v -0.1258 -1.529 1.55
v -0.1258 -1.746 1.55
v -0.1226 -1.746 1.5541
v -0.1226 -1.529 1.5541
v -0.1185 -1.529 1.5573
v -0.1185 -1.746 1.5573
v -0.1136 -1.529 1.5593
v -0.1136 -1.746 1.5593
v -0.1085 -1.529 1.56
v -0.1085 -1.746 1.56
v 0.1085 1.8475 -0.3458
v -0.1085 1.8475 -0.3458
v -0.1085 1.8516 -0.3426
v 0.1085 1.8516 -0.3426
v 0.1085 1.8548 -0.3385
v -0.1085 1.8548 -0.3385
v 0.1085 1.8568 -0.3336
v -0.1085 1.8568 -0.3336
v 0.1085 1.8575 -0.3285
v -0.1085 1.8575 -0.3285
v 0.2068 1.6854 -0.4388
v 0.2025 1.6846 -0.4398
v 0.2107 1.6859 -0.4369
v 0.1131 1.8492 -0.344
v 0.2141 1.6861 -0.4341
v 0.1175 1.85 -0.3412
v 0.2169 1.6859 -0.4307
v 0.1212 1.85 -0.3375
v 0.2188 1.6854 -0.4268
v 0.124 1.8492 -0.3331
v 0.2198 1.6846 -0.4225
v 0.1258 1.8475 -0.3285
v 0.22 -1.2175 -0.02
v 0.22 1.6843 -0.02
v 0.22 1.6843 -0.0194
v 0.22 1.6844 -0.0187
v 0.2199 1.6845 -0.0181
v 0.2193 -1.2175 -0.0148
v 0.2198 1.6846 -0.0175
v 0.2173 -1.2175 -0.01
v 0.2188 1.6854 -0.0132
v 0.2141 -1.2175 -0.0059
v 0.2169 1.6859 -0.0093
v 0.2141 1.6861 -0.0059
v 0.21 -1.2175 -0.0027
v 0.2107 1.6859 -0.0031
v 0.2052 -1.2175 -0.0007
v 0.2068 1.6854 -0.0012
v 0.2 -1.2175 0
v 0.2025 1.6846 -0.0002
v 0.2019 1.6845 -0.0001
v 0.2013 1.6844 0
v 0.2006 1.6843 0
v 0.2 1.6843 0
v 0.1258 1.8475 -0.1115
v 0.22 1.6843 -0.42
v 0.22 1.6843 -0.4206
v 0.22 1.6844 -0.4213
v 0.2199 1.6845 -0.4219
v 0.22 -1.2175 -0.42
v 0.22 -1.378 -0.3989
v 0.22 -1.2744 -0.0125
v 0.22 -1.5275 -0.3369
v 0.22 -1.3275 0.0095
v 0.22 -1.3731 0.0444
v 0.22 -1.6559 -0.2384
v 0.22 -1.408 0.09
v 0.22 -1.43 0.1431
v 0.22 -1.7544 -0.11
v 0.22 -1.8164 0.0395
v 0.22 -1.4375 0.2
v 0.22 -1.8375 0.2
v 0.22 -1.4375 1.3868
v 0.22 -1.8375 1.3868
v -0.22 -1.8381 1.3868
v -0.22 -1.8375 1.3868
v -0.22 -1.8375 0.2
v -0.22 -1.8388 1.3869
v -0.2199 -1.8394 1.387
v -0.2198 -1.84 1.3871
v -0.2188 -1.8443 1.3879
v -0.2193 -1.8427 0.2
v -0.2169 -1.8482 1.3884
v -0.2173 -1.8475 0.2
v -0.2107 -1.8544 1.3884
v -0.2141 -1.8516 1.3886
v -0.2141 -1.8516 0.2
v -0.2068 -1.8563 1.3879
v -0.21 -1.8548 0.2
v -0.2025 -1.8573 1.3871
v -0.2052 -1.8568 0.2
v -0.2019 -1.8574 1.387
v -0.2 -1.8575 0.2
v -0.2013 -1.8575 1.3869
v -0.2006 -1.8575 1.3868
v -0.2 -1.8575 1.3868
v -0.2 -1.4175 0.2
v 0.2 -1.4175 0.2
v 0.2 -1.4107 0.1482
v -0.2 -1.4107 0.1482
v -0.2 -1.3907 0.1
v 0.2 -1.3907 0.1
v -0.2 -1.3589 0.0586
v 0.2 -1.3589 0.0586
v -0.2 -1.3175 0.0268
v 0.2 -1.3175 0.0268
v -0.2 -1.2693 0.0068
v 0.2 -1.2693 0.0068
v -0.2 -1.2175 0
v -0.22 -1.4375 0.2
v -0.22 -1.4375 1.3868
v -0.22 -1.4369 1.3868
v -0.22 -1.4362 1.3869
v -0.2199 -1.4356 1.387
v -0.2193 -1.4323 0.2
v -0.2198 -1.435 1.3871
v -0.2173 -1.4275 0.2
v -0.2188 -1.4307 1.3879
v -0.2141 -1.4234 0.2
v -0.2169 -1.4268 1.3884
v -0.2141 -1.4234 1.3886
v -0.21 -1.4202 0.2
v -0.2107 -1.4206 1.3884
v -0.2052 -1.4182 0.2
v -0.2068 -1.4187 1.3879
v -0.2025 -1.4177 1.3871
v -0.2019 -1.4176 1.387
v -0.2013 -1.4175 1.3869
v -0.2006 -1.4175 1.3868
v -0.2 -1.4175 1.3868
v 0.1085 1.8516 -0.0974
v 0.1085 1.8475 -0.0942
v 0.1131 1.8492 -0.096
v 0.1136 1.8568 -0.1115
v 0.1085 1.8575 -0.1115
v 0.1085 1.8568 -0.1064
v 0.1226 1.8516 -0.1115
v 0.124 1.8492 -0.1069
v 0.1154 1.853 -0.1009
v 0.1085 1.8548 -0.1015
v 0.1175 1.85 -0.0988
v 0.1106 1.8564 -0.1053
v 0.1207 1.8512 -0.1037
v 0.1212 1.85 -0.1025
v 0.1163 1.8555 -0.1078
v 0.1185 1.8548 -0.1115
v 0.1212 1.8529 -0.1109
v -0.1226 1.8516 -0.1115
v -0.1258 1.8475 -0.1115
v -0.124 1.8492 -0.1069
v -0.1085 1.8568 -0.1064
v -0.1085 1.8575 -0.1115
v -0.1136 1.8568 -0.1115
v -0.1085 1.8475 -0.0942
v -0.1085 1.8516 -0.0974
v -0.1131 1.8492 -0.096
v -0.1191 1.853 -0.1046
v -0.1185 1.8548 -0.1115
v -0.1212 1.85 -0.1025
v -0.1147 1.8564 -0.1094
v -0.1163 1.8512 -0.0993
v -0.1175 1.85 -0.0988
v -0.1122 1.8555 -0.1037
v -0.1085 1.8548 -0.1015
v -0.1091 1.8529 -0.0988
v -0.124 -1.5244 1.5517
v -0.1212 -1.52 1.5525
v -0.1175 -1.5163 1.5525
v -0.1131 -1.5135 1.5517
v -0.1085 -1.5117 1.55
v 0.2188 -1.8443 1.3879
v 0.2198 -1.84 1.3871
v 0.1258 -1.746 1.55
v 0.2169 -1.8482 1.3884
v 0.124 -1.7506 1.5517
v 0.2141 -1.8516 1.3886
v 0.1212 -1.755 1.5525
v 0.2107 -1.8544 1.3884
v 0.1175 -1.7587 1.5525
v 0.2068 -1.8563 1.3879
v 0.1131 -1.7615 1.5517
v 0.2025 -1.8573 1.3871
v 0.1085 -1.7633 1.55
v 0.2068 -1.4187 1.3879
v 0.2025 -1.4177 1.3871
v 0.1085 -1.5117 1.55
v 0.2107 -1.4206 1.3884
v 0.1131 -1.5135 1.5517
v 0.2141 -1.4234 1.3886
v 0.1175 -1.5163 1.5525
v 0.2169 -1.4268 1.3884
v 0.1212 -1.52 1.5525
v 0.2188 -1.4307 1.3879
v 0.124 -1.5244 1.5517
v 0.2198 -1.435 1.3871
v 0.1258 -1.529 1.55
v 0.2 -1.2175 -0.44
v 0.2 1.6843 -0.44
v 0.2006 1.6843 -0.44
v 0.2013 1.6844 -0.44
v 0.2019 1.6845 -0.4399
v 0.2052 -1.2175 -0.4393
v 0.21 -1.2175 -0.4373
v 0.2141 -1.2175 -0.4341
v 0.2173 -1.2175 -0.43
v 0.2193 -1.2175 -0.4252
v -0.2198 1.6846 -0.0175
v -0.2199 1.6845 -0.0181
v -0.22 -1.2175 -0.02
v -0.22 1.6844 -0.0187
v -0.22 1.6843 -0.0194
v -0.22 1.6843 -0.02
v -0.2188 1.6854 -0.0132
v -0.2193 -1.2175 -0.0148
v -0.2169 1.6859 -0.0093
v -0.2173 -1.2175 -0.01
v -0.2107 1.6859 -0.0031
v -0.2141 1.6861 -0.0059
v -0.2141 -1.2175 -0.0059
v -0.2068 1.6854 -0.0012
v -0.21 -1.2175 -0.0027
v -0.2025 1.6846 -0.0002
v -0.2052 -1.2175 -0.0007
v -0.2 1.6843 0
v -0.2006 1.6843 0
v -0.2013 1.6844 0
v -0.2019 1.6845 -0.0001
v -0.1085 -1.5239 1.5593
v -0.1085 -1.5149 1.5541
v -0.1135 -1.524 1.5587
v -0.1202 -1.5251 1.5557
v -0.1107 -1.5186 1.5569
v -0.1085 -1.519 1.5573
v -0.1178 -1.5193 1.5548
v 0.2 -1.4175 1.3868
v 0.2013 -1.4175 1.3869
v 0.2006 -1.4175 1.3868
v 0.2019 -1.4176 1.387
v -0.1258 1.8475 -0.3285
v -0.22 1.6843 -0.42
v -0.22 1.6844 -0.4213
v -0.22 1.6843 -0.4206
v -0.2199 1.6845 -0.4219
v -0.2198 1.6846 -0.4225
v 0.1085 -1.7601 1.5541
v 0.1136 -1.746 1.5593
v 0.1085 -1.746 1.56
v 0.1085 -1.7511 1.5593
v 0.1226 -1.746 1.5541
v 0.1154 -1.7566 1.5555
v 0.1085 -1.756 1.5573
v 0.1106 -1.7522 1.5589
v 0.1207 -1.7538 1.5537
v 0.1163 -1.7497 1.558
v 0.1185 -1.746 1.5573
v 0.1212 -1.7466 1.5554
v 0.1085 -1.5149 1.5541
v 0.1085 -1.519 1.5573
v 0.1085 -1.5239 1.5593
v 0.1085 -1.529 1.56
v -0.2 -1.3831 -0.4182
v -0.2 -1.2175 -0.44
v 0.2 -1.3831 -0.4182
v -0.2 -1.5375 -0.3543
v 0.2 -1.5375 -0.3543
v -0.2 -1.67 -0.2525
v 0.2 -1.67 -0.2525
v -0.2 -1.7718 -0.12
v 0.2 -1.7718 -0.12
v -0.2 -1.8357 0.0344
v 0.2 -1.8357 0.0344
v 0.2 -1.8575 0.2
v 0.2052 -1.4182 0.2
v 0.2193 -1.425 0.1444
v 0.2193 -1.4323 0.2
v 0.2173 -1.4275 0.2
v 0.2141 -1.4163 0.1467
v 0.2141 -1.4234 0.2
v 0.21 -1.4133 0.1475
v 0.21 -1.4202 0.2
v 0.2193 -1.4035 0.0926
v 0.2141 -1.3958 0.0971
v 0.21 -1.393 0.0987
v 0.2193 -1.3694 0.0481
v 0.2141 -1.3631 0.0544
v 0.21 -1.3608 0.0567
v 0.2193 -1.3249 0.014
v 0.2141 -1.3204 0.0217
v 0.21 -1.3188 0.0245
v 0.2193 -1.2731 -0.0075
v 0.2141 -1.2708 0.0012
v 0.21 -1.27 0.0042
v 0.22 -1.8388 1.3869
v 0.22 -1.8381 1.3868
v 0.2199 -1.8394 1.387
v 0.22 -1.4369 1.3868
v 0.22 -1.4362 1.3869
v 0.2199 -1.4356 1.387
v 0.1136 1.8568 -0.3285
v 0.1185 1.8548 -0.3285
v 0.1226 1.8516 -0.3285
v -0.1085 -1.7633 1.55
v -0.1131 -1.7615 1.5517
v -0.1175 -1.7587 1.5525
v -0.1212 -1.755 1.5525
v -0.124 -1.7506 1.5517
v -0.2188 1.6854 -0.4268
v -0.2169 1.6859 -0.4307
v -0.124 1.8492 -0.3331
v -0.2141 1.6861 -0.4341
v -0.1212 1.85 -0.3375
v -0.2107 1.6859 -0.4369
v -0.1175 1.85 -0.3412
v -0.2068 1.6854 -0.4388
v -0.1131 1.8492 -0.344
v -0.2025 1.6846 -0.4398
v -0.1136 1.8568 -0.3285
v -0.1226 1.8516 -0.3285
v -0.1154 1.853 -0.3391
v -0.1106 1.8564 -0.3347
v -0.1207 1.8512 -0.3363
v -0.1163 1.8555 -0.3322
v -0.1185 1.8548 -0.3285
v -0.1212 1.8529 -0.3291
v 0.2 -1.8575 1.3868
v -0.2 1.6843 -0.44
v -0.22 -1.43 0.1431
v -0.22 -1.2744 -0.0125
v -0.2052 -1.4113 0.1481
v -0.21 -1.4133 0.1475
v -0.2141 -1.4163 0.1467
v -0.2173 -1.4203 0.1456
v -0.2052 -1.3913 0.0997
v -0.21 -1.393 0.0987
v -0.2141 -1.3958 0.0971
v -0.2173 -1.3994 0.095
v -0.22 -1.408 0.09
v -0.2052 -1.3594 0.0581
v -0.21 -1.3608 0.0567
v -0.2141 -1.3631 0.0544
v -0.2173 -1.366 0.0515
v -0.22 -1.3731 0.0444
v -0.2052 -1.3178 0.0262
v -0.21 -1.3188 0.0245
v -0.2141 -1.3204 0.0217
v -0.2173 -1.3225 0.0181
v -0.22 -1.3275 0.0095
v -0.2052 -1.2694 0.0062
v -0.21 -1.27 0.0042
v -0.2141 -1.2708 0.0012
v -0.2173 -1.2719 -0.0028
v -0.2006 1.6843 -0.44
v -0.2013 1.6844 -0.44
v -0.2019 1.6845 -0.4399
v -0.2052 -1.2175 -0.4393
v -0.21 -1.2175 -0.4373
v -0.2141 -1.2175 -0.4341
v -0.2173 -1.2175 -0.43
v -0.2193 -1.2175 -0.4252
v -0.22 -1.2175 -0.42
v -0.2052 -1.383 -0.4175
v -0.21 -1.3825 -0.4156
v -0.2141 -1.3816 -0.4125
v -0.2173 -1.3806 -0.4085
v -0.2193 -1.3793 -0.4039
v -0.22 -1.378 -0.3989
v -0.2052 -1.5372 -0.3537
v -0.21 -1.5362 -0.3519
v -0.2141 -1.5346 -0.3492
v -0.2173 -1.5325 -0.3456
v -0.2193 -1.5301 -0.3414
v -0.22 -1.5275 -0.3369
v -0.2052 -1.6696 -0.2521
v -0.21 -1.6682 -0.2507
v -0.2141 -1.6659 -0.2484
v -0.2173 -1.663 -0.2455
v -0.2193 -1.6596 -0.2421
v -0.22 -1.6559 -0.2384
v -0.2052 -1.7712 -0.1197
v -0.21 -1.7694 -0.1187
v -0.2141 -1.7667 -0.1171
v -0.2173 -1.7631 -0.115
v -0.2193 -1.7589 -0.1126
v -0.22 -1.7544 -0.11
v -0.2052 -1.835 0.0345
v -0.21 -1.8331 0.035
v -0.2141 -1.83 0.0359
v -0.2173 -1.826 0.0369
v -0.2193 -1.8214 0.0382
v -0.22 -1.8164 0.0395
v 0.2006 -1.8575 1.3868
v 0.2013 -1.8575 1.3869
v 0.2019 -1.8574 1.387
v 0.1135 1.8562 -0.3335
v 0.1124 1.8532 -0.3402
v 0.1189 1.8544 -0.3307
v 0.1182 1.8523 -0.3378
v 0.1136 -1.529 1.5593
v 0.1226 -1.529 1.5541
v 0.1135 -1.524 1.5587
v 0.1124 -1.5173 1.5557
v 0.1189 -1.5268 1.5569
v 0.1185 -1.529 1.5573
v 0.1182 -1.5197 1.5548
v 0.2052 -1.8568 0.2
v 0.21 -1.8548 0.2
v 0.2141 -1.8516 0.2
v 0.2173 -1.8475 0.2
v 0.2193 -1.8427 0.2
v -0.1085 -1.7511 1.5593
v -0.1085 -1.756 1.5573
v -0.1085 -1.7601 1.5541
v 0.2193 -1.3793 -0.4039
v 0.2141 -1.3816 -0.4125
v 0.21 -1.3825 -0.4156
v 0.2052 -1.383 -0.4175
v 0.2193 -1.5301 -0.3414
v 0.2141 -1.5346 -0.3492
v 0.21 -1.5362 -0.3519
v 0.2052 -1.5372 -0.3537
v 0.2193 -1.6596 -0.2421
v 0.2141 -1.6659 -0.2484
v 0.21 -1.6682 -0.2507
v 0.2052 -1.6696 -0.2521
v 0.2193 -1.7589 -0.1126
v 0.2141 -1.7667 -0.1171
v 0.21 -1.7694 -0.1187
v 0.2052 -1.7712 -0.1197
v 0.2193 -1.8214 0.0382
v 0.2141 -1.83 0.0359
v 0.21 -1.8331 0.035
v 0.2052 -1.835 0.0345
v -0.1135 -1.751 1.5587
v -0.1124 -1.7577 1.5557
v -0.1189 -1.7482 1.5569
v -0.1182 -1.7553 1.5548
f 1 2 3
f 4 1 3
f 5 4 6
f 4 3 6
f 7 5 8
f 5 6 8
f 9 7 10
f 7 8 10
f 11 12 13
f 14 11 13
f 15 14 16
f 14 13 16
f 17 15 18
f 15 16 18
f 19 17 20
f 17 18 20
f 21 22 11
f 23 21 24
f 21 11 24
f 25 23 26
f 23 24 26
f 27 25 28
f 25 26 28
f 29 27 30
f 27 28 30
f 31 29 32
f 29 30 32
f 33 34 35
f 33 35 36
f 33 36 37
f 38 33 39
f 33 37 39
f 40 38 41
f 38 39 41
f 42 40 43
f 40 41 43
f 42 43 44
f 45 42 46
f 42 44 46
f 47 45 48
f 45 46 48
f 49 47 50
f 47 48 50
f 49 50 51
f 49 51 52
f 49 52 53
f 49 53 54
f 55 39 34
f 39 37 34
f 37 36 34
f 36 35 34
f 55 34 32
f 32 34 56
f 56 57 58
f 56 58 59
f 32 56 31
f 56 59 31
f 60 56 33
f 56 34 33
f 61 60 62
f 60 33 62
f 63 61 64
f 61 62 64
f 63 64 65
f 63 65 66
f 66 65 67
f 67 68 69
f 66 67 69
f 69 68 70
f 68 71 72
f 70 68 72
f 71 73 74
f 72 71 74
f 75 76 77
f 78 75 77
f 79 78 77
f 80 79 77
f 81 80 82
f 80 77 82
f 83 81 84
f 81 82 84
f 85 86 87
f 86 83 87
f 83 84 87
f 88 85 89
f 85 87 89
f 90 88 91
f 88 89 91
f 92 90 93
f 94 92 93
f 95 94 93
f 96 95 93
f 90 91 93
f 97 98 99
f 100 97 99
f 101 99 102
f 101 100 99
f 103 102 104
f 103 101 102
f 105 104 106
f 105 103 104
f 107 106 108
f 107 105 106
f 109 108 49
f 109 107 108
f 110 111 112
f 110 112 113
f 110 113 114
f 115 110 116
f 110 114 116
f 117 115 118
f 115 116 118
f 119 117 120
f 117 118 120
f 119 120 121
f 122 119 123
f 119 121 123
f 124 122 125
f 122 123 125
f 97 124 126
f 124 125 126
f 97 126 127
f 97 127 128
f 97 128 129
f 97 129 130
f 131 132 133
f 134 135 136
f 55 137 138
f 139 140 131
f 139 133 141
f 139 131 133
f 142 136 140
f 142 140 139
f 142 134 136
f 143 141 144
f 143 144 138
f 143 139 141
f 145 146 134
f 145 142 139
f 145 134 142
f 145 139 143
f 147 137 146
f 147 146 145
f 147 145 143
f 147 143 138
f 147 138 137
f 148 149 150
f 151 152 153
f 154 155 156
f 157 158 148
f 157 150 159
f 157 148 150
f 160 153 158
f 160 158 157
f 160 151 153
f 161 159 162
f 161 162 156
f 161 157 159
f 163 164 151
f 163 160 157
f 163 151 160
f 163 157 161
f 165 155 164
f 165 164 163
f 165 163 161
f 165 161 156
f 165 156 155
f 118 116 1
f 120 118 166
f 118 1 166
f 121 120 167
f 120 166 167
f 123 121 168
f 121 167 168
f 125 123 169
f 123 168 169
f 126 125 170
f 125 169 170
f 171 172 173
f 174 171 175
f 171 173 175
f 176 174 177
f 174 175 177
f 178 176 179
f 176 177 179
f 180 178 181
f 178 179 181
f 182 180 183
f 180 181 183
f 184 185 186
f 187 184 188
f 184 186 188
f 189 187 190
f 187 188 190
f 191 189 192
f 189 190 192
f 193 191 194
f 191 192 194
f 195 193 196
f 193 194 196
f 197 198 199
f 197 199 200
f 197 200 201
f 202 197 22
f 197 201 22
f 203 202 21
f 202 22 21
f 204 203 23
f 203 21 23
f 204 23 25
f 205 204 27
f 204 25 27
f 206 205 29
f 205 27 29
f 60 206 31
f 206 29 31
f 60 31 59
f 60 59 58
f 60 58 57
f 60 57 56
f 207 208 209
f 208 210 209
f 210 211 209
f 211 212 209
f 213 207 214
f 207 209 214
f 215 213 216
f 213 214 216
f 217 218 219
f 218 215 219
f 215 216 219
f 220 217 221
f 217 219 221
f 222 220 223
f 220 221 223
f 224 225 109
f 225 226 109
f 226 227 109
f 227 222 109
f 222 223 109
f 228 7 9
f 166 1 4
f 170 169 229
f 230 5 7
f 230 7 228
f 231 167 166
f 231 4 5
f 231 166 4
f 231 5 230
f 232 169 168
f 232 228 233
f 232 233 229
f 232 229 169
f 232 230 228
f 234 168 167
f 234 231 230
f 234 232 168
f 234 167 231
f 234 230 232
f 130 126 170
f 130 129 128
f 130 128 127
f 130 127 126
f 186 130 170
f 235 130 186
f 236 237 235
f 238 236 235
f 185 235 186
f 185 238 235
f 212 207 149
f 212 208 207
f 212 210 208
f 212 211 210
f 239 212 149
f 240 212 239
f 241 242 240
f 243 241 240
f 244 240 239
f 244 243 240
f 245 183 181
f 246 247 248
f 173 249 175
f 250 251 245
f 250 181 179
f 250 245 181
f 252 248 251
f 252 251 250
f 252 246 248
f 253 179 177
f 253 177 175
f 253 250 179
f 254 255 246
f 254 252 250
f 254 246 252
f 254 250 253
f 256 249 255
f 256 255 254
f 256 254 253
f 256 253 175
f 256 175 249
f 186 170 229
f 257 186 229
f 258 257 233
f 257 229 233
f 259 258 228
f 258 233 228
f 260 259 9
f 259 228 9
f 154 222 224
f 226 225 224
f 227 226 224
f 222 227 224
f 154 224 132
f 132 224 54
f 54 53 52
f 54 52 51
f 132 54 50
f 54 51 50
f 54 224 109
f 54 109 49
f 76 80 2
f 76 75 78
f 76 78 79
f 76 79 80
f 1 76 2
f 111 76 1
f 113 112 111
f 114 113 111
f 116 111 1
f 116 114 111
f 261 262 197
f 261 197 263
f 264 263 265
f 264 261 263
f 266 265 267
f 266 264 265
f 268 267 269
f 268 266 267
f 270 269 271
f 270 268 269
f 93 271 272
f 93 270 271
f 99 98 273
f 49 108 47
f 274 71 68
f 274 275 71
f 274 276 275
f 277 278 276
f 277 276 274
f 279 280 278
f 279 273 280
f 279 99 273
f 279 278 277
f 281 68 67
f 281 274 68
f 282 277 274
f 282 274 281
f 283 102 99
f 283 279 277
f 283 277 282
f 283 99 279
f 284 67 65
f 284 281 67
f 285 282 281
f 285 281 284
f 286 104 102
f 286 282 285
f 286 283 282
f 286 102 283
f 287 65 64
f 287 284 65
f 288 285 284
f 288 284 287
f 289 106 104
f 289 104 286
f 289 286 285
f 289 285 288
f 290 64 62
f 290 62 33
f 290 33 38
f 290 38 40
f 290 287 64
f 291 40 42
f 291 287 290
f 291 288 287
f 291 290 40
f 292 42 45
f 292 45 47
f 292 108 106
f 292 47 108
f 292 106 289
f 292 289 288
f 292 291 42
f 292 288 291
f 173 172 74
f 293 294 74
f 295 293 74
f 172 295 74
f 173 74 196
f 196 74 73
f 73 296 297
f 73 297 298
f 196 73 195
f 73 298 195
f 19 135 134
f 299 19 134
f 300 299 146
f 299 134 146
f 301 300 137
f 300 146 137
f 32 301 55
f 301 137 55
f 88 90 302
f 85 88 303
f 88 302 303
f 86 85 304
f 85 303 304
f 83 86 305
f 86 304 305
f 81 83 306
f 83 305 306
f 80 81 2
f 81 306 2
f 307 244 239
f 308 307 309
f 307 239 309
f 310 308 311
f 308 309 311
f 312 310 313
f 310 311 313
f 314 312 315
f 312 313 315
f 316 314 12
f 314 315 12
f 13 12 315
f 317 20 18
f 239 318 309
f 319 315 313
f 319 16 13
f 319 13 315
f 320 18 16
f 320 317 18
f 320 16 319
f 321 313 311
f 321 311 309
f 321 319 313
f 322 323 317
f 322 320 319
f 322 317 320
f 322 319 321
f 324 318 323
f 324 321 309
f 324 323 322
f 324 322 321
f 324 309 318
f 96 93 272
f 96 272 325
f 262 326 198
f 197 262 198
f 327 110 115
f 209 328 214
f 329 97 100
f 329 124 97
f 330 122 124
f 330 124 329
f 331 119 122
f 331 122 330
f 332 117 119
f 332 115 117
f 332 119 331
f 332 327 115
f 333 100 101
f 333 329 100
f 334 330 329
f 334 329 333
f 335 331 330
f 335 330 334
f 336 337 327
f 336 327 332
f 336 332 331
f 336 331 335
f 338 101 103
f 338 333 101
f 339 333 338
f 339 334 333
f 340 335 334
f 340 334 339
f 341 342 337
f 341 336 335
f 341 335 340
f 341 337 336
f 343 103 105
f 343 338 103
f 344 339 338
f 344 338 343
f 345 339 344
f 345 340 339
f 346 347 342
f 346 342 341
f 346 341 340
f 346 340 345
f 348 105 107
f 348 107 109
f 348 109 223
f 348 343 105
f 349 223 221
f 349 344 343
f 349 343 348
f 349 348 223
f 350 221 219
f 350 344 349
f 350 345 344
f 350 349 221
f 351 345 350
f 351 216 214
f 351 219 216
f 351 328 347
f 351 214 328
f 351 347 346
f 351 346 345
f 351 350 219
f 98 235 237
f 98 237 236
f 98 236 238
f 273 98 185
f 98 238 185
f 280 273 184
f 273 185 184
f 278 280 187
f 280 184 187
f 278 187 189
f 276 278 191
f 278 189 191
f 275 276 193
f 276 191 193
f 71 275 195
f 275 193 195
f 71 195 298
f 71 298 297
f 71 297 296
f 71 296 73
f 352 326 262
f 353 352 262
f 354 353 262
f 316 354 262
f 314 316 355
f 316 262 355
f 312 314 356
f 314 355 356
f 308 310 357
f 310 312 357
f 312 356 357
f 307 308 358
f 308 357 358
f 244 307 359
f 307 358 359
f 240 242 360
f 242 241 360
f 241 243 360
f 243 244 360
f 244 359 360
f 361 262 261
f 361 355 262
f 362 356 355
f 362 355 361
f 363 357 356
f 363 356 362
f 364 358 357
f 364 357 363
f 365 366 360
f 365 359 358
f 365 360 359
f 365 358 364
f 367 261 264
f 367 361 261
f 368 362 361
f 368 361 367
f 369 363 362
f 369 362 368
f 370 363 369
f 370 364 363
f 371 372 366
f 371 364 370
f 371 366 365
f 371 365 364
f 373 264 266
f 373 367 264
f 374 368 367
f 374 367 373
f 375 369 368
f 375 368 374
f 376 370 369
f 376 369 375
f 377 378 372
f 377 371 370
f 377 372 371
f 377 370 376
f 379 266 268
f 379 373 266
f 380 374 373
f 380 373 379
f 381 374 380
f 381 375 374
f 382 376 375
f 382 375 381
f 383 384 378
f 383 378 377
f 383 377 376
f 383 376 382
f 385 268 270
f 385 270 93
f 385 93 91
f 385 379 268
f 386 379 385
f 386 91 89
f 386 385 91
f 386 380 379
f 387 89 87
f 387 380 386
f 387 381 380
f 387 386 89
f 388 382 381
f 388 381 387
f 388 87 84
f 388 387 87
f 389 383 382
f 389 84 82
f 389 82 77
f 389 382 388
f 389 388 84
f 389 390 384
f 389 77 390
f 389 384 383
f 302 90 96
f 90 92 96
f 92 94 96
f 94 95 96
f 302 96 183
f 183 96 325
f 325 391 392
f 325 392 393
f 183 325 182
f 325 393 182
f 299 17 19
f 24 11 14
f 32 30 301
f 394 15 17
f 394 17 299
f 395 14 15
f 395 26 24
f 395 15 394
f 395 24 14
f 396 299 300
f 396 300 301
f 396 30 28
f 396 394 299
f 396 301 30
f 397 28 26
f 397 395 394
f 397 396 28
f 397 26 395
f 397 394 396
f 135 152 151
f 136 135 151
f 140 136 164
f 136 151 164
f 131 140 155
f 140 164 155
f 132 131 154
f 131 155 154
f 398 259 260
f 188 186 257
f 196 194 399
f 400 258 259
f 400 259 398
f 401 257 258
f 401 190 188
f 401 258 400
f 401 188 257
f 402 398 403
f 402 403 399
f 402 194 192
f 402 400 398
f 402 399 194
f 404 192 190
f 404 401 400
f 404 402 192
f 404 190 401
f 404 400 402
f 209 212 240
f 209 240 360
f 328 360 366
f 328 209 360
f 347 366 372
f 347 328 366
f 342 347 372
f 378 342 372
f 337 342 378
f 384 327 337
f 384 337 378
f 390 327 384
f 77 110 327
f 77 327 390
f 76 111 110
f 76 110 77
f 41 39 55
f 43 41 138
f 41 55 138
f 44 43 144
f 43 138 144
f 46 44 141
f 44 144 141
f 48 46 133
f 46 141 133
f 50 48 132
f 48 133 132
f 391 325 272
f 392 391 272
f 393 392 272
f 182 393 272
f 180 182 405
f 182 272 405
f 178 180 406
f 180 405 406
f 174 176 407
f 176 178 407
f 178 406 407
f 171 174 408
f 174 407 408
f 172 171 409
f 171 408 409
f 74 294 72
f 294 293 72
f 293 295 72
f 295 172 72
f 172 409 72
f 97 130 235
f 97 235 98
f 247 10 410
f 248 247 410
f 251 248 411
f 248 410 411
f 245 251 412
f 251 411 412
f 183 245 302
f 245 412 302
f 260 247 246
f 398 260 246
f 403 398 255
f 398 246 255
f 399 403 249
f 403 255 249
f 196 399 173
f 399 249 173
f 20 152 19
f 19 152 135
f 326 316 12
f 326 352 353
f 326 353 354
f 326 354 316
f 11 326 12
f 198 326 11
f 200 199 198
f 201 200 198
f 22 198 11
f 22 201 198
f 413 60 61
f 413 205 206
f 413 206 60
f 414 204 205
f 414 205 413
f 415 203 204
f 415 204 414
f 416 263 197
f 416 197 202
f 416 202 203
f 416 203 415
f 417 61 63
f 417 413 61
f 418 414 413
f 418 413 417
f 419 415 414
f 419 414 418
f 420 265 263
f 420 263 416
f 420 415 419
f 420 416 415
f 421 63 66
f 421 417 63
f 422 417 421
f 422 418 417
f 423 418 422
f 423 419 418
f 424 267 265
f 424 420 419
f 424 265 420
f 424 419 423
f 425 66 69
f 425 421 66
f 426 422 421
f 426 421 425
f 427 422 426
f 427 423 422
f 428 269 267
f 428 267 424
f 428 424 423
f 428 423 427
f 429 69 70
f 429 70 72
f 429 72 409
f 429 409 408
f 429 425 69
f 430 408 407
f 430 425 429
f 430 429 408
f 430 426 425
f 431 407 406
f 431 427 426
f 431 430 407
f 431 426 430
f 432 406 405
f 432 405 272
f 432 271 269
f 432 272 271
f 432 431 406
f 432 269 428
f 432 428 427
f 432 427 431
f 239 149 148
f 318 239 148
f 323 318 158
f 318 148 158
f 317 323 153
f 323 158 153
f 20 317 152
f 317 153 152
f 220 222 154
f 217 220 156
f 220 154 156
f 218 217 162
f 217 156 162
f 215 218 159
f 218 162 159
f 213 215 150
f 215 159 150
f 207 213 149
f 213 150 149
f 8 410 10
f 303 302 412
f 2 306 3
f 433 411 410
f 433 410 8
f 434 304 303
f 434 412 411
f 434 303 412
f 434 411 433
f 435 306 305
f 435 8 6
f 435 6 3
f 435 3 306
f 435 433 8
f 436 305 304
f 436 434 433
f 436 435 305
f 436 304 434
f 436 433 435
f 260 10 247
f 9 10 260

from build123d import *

# Parameters (mm, degrees)
SKETCH2_W                        = 0.44
SKETCH2_H                        = 3.715
BASE_FLANGE1_DEPTH               = 0.44
SM_EDGE_FLANGE_1_STRIP_W         = 2.16
SM_EDGE_FLANGE_1_STRIP_H         = 0.44
SM_EDGE_FLANGE_1_STRIP_CUT_DEPTH = 0.44
SM_EDGE_FLANGE_1_DEPTH           = 0.44
CHAMFER2_SIZE                    = 0.1
CHAMFER2_SIZE2                   = 0.173205081
CHAMFER3_SIZE                    = 0.1
CHAMFER3_SIZE2                   = 0.173205081
FILLET1_R                        = 0.02


# Sheet-metal steps are written as plain solids
with BuildPart() as part:
    # Base-Flange1: sheet metal written as solids
    # Sketch2 → Base-Flange1 (new body)
    with BuildSketch(Plane.XY):
        Rectangle(SKETCH2_W, SKETCH2_H)
    extrude(amount=-BASE_FLANGE1_DEPTH)

    # 边线-法兰1: sheet metal written as solids
    # 边线-法兰1 strip (on a plane across the edge) → 边线-法兰1 strip cut (cut)
    with BuildSketch(Plane(origin=(-0.22, -1.8575, 0), x_dir=(0, 1, 0), z_dir=(1, 0, 0))):
        with Locations((-0.44, -0.22)):
            Rectangle(SM_EDGE_FLANGE_1_STRIP_W, SM_EDGE_FLANGE_1_STRIP_H)
    extrude(amount=SM_EDGE_FLANGE_1_STRIP_CUT_DEPTH, mode=Mode.SUBTRACT)

    # 边线-法兰1 section (on a plane across the edge) → 边线-法兰1 (add)
    with BuildSketch(Plane(origin=(-0.22, -1.8575, 0), x_dir=(0, 1, 0), z_dir=(1, 0, 0))):
        with BuildLine():
            Line((0, 0.2), (0, 1.56))
            Line((0, 1.56), (0.44, 1.56))
            Line((0.44, 1.56), (0.44, 0.2))
            ThreePointArc((0.44, 0.2), (0.498578644, 0.058578644), (0.64, 0))
            Line((0.64, 0), (0.64, -0.44))
            ThreePointArc((0.64, -0.44), (0.18745166, -0.25254834), (0, 0.2))
        make_face()
    extrude(amount=SM_EDGE_FLANGE_1_DEPTH)

    # Chamfer2
    chamfer2_edges = [part.edges().sort_by_distance(p)[0] for p in [
        (0, 1.8575, 0),
        (-0.22, 1.8575, -0.22),
        (0.22, 1.8575, -0.22),
        (0, 1.8575, -0.44),
    ]]
    chamfer2_side = [part.faces().sort_by_distance(p)[0] for p in [
        (0, 1.8575, -0.22),
    ]]
    chamfer(chamfer2_edges, length=CHAMFER2_SIZE, length2=CHAMFER2_SIZE2, reference=chamfer2_side[0])

    # Chamfer3
    chamfer3_edges = [part.edges().sort_by_distance(p)[0] for p in [
        (-0.22, -1.6375, 1.56),
        (0, -1.8575, 1.56),
        (0, -1.4175, 1.56),
        (0.22, -1.6375, 1.56),
    ]]
    chamfer3_side = [part.faces().sort_by_distance(p)[0] for p in [
        (0, -1.6375, 1.56),
    ]]
    chamfer(chamfer3_edges, length=CHAMFER3_SIZE, length2=CHAMFER3_SIZE2, reference=chamfer3_side[0])

    # Fillet1
    # the kernel refuses this fillet: 0.02 mm, written as the material it takes off along each edge
    with BuildSketch(Plane(origin=(-0.108452995, 1.8375, -0.111547005), x_dir=(0.8320502943378433, 0.48038446141526264, -0.27735009811261363), z_dir=(-0.36927447293799925, 0.8528028654224409, 0.3692744729379992))) as fillet1_piece_1_section:
        Polygon((-0.030983867, -0.030983867), (0.030983867, -0.030983867), (0.030983867, 0.030983867), (-0.030983867, 0.030983867), align=None)
    fillet1_piece_1 = extrude(amount=0.030983867, mode=Mode.PRIVATE)
    fillet1_piece_1 = split(fillet1_piece_1, bisect_by=Plane(origin=(-0.108452995, 1.8375, -0.111547005), z_dir=(-1, 0, 0)), keep=Keep.TOP, mode=Mode.PRIVATE)
    fillet1_piece_1 = split(fillet1_piece_1, bisect_by=Plane(origin=(-0.108452995, 1.8375, -0.111547005), z_dir=(0, 0, 1)), keep=Keep.TOP, mode=Mode.PRIVATE)
    fillet1_piece_1 = split(fillet1_piece_1, bisect_by=Plane(origin=(-0.108452995, 1.8375, -0.111547005), z_dir=(0.4472135954999562, 0.7745966692414853, -0.4472135954999563)), keep=Keep.TOP, mode=Mode.PRIVATE)
    fillet1_piece_1 = split(fillet1_piece_1, bisect_by=Plane(origin=(-0.108452995, 1.8475, -0.094226497), z_dir=(0, -0.4999999999999977, -0.8660254037844399)), keep=Keep.TOP, mode=Mode.PRIVATE)
    fillet1_piece_1 = split(fillet1_piece_1, bisect_by=Plane(origin=(-0.108452995, 1.8575, -0.111547005), z_dir=(0, -1, 0)), keep=Keep.TOP, mode=Mode.PRIVATE)
    fillet1_piece_1 = split(fillet1_piece_1, bisect_by=Plane(origin=(-0.125773503, 1.8475, -0.111547005), z_dir=(0.86602540378444, -0.4999999999999976, 0)), keep=Keep.TOP, mode=Mode.PRIVATE)
    fillet1_piece_1 = fillet1_piece_1 - Plane(origin=(-0.108452995, 1.8375, -0.111547005), x_dir=(0.36927447293799925, -0.8528028654224409, -0.3692744729379992), z_dir=(0.8320502943378433, 0.48038446141526264, -0.27735009811261363)) * Sphere(FILLET1_R, mode=Mode.PRIVATE)
    add(fillet1_piece_1, mode=Mode.SUBTRACT)
    with BuildSketch(Plane(origin=(0.108452995, 1.8375, -0.111547005), x_dir=(-0.27735009811261363, 0.48038446141526264, -0.8320502943378434), z_dir=(0.36927447293799914, 0.8528028654224408, 0.36927447293799914))) as fillet1_piece_2_section:
        Polygon((-0.030983867, -0.030983867), (0.030983867, -0.030983867), (0.030983867, 0.030983867), (-0.030983867, 0.030983867), align=None)
    fillet1_piece_2 = extrude(amount=0.030983867, mode=Mode.PRIVATE)
    fillet1_piece_2 = split(fillet1_piece_2, bisect_by=Plane(origin=(0.108452995, 1.8375, -0.111547005), z_dir=(-0.4472135954999564, 0.7745966692414853, -0.4472135954999563)), keep=Keep.TOP, mode=Mode.PRIVATE)
    fillet1_piece_2 = split(fillet1_piece_2, bisect_by=Plane(origin=(0.108452995, 1.8375, -0.111547005), z_dir=(1, 0, 0)), keep=Keep.TOP, mode=Mode.PRIVATE)
    fillet1_piece_2 = split(fillet1_piece_2, bisect_by=Plane(origin=(0.108452995, 1.8375, -0.111547005), z_dir=(0, 0, 1)), keep=Keep.TOP, mode=Mode.PRIVATE)
    fillet1_piece_2 = split(fillet1_piece_2, bisect_by=Plane(origin=(0.125773503, 1.8475, -0.111547005), z_dir=(-0.8660254037844399, -0.4999999999999978, 0)), keep=Keep.TOP, mode=Mode.PRIVATE)
    fillet1_piece_2 = split(fillet1_piece_2, bisect_by=Plane(origin=(0.108452995, 1.8475, -0.094226497), z_dir=(0, -0.4999999999999977, -0.8660254037844399)), keep=Keep.TOP, mode=Mode.PRIVATE)
    fillet1_piece_2 = split(fillet1_piece_2, bisect_by=Plane(origin=(0.108452995, 1.8575, -0.111547005), z_dir=(0, -1, 0)), keep=Keep.TOP, mode=Mode.PRIVATE)
    fillet1_piece_2 = fillet1_piece_2 - Plane(origin=(0.108452995, 1.8375, -0.111547005), x_dir=(-0.36927447293799914, -0.8528028654224408, -0.36927447293799914), z_dir=(-0.27735009811261363, 0.48038446141526264, -0.8320502943378434)) * Sphere(FILLET1_R, mode=Mode.PRIVATE)
    add(fillet1_piece_2, mode=Mode.SUBTRACT)
    with BuildSketch(Plane(origin=(0.108452995, 1.8375, -0.328452995), x_dir=(0.27735009811261363, -0.48038446141526264, -0.8320502943378434), z_dir=(0.36927447293799914, 0.8528028654224408, -0.36927447293799914))) as fillet1_piece_3_section:
        Polygon((-0.030983867, -0.030983867), (0.030983867, -0.030983867), (0.030983867, 0.030983867), (-0.030983867, 0.030983867), align=None)
    fillet1_piece_3 = extrude(amount=0.030983867, mode=Mode.PRIVATE)
    fillet1_piece_3 = split(fillet1_piece_3, bisect_by=Plane(origin=(0.108452995, 1.8375, -0.328452995), z_dir=(0, 0, -1)), keep=Keep.TOP, mode=Mode.PRIVATE)
    fillet1_piece_3 = split(fillet1_piece_3, bisect_by=Plane(origin=(0.108452995, 1.8375, -0.328452995), z_dir=(1, 0, 0)), keep=Keep.TOP, mode=Mode.PRIVATE)
    fillet1_piece_3 = split(fillet1_piece_3, bisect_by=Plane(origin=(0.108452995, 1.8375, -0.328452995), z_dir=(-0.4472135954999563, 0.7745966692414852, 0.4472135954999564)), keep=Keep.TOP, mode=Mode.PRIVATE)
    fillet1_piece_3 = split(fillet1_piece_3, bisect_by=Plane(origin=(0.125773503, 1.8475, -0.328452995), z_dir=(-0.8660254037844399, -0.4999999999999978, 0)), keep=Keep.TOP, mode=Mode.PRIVATE)
    fillet1_piece_3 = split(fillet1_piece_3, bisect_by=Plane(origin=(0.108452995, 1.8575, -0.328452995), z_dir=(0, -1, 0)), keep=Keep.TOP, mode=Mode.PRIVATE)
    fillet1_piece_3 = split(fillet1_piece_3, bisect_by=Plane(origin=(0.108452995, 1.8475, -0.345773503), z_dir=(0, -0.49999999999999784, 0.8660254037844399)), keep=Keep.TOP, mode=Mode.PRIVATE)
    fillet1_piece_3 = fillet1_piece_3 - Plane(origin=(0.108452995, 1.8375, -0.328452995), x_dir=(-0.36927447293799914, -0.8528028654224408, 0.36927447293799914), z_dir=(0.27735009811261363, -0.48038446141526264, -0.8320502943378434)) * Sphere(FILLET1_R, mode=Mode.PRIVATE)
    add(fillet1_piece_3, mode=Mode.SUBTRACT)
    with BuildSketch(Plane(origin=(-0.108452995, 1.8375, -0.328452995), x_dir=(0.2773500981126135, 0.48038446141526264, 0.8320502943378434), z_dir=(-0.36927447293799925, 0.8528028654224409, -0.3692744729379992))) as fillet1_piece_4_section:
        Polygon((-0.030983867, -0.030983867), (0.030983867, -0.030983867), (0.030983867, 0.030983867), (-0.030983867, 0.030983867), align=None)
    fillet1_piece_4 = extrude(amount=0.030983867, mode=Mode.PRIVATE)
    fillet1_piece_4 = split(fillet1_piece_4, bisect_by=Plane(origin=(-0.108452995, 1.8375, -0.328452995), z_dir=(0, 0, -1)), keep=Keep.TOP, mode=Mode.PRIVATE)
    fillet1_piece_4 = split(fillet1_piece_4, bisect_by=Plane(origin=(-0.108452995, 1.8375, -0.328452995), z_dir=(-1, 0, 0)), keep=Keep.TOP, mode=Mode.PRIVATE)
    fillet1_piece_4 = split(fillet1_piece_4, bisect_by=Plane(origin=(-0.108452995, 1.8375, -0.328452995), z_dir=(0.44721359549995615, 0.7745966692414852, 0.4472135954999564)), keep=Keep.TOP, mode=Mode.PRIVATE)
    fillet1_piece_4 = split(fillet1_piece_4, bisect_by=Plane(origin=(-0.125773503, 1.8475, -0.328452995), z_dir=(0.86602540378444, -0.4999999999999976, 0)), keep=Keep.TOP, mode=Mode.PRIVATE)
    fillet1_piece_4 = split(fillet1_piece_4, bisect_by=Plane(origin=(-0.108452995, 1.8575, -0.328452995), z_dir=(0, -1, 0)), keep=Keep.TOP, mode=Mode.PRIVATE)
    fillet1_piece_4 = split(fillet1_piece_4, bisect_by=Plane(origin=(-0.108452995, 1.8475, -0.345773503), z_dir=(0, -0.49999999999999784, 0.8660254037844399)), keep=Keep.TOP, mode=Mode.PRIVATE)
    fillet1_piece_4 = fillet1_piece_4 - Plane(origin=(-0.108452995, 1.8375, -0.328452995), x_dir=(0.36927447293799925, -0.8528028654224409, 0.3692744729379992), z_dir=(0.2773500981126135, 0.48038446141526264, 0.8320502943378434)) * Sphere(FILLET1_R, mode=Mode.PRIVATE)
    add(fillet1_piece_4, mode=Mode.SUBTRACT)
    with BuildSketch(Plane(origin=(-0.108452995, -1.529047005, 1.54), x_dir=(-0.8320502943378433, 0.27735009811261585, -0.48038446141526164), z_dir=(-0.3692744729379991, 0.3692744729379959, 0.8528028654224422))) as fillet1_piece_5_section:
        Polygon((-0.030983867, -0.030983867), (0.030983867, -0.030983867), (0.030983867, 0.030983867), (-0.030983867, 0.030983867), align=None)
    fillet1_piece_5 = extrude(amount=0.030983867, mode=Mode.PRIVATE)
    fillet1_piece_5 = split(fillet1_piece_5, bisect_by=Plane(origin=(-0.108452995, -1.529047005, 1.54), z_dir=(0.44721359549995615, -0.4472135954999597, 0.7745966692414834)), keep=Keep.TOP, mode=Mode.PRIVATE)
    fillet1_piece_5 = split(fillet1_piece_5, bisect_by=Plane(origin=(-0.108452995, -1.529047005, 1.54), z_dir=(0, 1, 0)), keep=Keep.TOP, mode=Mode.PRIVATE)
    fillet1_piece_5 = split(fillet1_piece_5, bisect_by=Plane(origin=(-0.108452995, -1.529047005, 1.54), z_dir=(-1, 0, 0)), keep=Keep.TOP, mode=Mode.PRIVATE)
    fillet1_piece_5 = split(fillet1_piece_5, bisect_by=Plane(origin=(-0.108452995, -1.511726497, 1.55), z_dir=(0, -0.8660254037844378, -0.5000000000000016)), keep=Keep.TOP, mode=Mode.PRIVATE)
    fillet1_piece_5 = split(fillet1_piece_5, bisect_by=Plane(origin=(-0.125773503, -1.529047005, 1.55), z_dir=(0.8660254037844399, 1.8461148906874763e-15, -0.4999999999999977)), keep=Keep.TOP, mode=Mode.PRIVATE)
    fillet1_piece_5 = split(fillet1_piece_5, bisect_by=Plane(origin=(-0.108452995, -1.529047005, 1.56), z_dir=(0, 0, -1)), keep=Keep.TOP, mode=Mode.PRIVATE)
    fillet1_piece_5 = fillet1_piece_5 - Plane(origin=(-0.108452995, -1.529047005, 1.54), x_dir=(0.3692744729379991, -0.3692744729379959, -0.8528028654224422), z_dir=(-0.8320502943378433, 0.27735009811261585, -0.48038446141526164)) * Sphere(FILLET1_R, mode=Mode.PRIVATE)
    add(fillet1_piece_5, mode=Mode.SUBTRACT)
    with BuildSketch(Plane(origin=(0.108452995, -1.529047005, 1.54), x_dir=(0.27735009811261335, 0.8320502943378454, -0.4803844614152595), z_dir=(0.3692744729379991, 0.369274472937996, 0.8528028654224422))) as fillet1_piece_6_section:
        Polygon((-0.030983867, -0.030983867), (0.030983867, -0.030983867), (0.030983867, 0.030983867), (-0.030983867, 0.030983867), align=None)
    fillet1_piece_6 = extrude(amount=0.030983867, mode=Mode.PRIVATE)
    fillet1_piece_6 = split(fillet1_piece_6, bisect_by=Plane(origin=(0.108452995, -1.529047005, 1.54), z_dir=(-0.4472135954999561, -0.44721359549995976, 0.7745966692414834)), keep=Keep.TOP, mode=Mode.PRIVATE)
    fillet1_piece_6 = split(fillet1_piece_6, bisect_by=Plane(origin=(0.108452995, -1.529047005, 1.54), z_dir=(1, 0, 0)), keep=Keep.TOP, mode=Mode.PRIVATE)
    fillet1_piece_6 = split(fillet1_piece_6, bisect_by=Plane(origin=(0.108452995, -1.529047005, 1.54), z_dir=(0, 1, 0)), keep=Keep.TOP, mode=Mode.PRIVATE)
    fillet1_piece_6 = split(fillet1_piece_6, bisect_by=Plane(origin=(0.125773503, -1.529047005, 1.55), z_dir=(-0.8660254037844399, 1.6396415147553242e-15, -0.4999999999999977)), keep=Keep.TOP, mode=Mode.PRIVATE)
    fillet1_piece_6 = split(fillet1_piece_6, bisect_by=Plane(origin=(0.108452995, -1.511726497, 1.55), z_dir=(0, -0.8660254037844378, -0.5000000000000016)), keep=Keep.TOP, mode=Mode.PRIVATE)
    fillet1_piece_6 = split(fillet1_piece_6, bisect_by=Plane(origin=(0.108452995, -1.529047005, 1.56), z_dir=(0, 0, -1)), keep=Keep.TOP, mode=Mode.PRIVATE)
    fillet1_piece_6 = fillet1_piece_6 - Plane(origin=(0.108452995, -1.529047005, 1.54), x_dir=(-0.3692744729379991, -0.369274472937996, -0.8528028654224422), z_dir=(0.27735009811261335, 0.8320502943378454, -0.4803844614152595)) * Sphere(FILLET1_R, mode=Mode.PRIVATE)
    add(fillet1_piece_6, mode=Mode.SUBTRACT)
    with BuildSketch(Plane(origin=(-0.108452995, -1.745952995, 1.54), x_dir=(-0.2773500981126135, -0.8320502943378416, -0.4803844614152656), z_dir=(-0.3692744729379992, -0.3692744729380023, 0.8528028654224395))) as fillet1_piece_7_section:
        Polygon((-0.030983867, -0.030983867), (0.030983867, -0.030983867), (0.030983867, 0.030983867), (-0.030983867, 0.030983867), align=None)
    fillet1_piece_7 = extrude(amount=0.030983867, mode=Mode.PRIVATE)
    fillet1_piece_7 = split(fillet1_piece_7, bisect_by=Plane(origin=(-0.108452995, -1.745952995, 1.54), z_dir=(0.44721359549995626, 0.44721359549995343, 0.774596669241487)), keep=Keep.TOP, mode=Mode.PRIVATE)
    fillet1_piece_7 = split(fillet1_piece_7, bisect_by=Plane(origin=(-0.108452995, -1.745952995, 1.54), z_dir=(-1, 0, 0)), keep=Keep.TOP, mode=Mode.PRIVATE)
    fillet1_piece_7 = split(fillet1_piece_7, bisect_by=Plane(origin=(-0.108452995, -1.745952995, 1.54), z_dir=(0, -1, 0)), keep=Keep.TOP, mode=Mode.PRIVATE)
    fillet1_piece_7 = split(fillet1_piece_7, bisect_by=Plane(origin=(-0.125773503, -1.745952995, 1.55), z_dir=(0.8660254037844399, 1.8461148906874763e-15, -0.4999999999999977)), keep=Keep.TOP, mode=Mode.PRIVATE)
    fillet1_piece_7 = split(fillet1_piece_7, bisect_by=Plane(origin=(-0.108452995, -1.763273503, 1.55), z_dir=(0, 0.8660254037844418, -0.49999999999999456)), keep=Keep.TOP, mode=Mode.PRIVATE)
    fillet1_piece_7 = split(fillet1_piece_7, bisect_by=Plane(origin=(-0.108452995, -1.745952995, 1.56), z_dir=(0, 0, -1)), keep=Keep.TOP, mode=Mode.PRIVATE)
    fillet1_piece_7 = fillet1_piece_7 - Plane(origin=(-0.108452995, -1.745952995, 1.54), x_dir=(0.3692744729379992, 0.3692744729380023, -0.8528028654224395), z_dir=(-0.2773500981126135, -0.8320502943378416, -0.4803844614152656)) * Sphere(FILLET1_R, mode=Mode.PRIVATE)
    add(fillet1_piece_7, mode=Mode.SUBTRACT)
    with BuildSketch(Plane(origin=(0.108452995, -1.745952995, 1.54), x_dir=(-0.27735009811261374, 0.8320502943378416, 0.4803844614152656), z_dir=(0.3692744729379992, -0.3692744729380022, 0.8528028654224395))) as fillet1_piece_8_section:
        Polygon((-0.030983867, -0.030983867), (0.030983867, -0.030983867), (0.030983867, 0.030983867), (-0.030983867, 0.030983867), align=None)
    fillet1_piece_8 = extrude(amount=0.030983867, mode=Mode.PRIVATE)
    fillet1_piece_8 = split(fillet1_piece_8, bisect_by=Plane(origin=(0.108452995, -1.745952995, 1.54), z_dir=(-0.4472135954999564, 0.44721359549995343, 0.774596669241487)), keep=Keep.TOP, mode=Mode.PRIVATE)
    fillet1_piece_8 = split(fillet1_piece_8, bisect_by=Plane(origin=(0.108452995, -1.745952995, 1.54), z_dir=(1, 0, 0)), keep=Keep.TOP, mode=Mode.PRIVATE)
    fillet1_piece_8 = split(fillet1_piece_8, bisect_by=Plane(origin=(0.108452995, -1.745952995, 1.54), z_dir=(0, -1, 0)), keep=Keep.TOP, mode=Mode.PRIVATE)
    fillet1_piece_8 = split(fillet1_piece_8, bisect_by=Plane(origin=(0.125773503, -1.745952995, 1.55), z_dir=(-0.8660254037844399, 1.6396415147553242e-15, -0.4999999999999977)), keep=Keep.TOP, mode=Mode.PRIVATE)
    fillet1_piece_8 = split(fillet1_piece_8, bisect_by=Plane(origin=(0.108452995, -1.763273503, 1.55), z_dir=(0, 0.8660254037844418, -0.49999999999999456)), keep=Keep.TOP, mode=Mode.PRIVATE)
    fillet1_piece_8 = split(fillet1_piece_8, bisect_by=Plane(origin=(0.108452995, -1.745952995, 1.56), z_dir=(0, 0, -1)), keep=Keep.TOP, mode=Mode.PRIVATE)
    fillet1_piece_8 = fillet1_piece_8 - Plane(origin=(0.108452995, -1.745952995, 1.54), x_dir=(-0.3692744729379992, 0.3692744729380022, -0.8528028654224395), z_dir=(-0.27735009811261374, 0.8320502943378416, 0.4803844614152656)) * Sphere(FILLET1_R, mode=Mode.PRIVATE)
    add(fillet1_piece_8, mode=Mode.SUBTRACT)
    with BuildSketch(Plane(origin=(0.22, 1.734294919, 0), x_dir=(-1, 0, 0), z_dir=(0, -1, 0)), Plane(origin=(-0.22, -1.2175, -0.44), x_dir=(0, 0, 1), z_dir=(0, 1, 0))) as fillet1_piece_9:
        with BuildLine():
            CenterArc((FILLET1_R, FILLET1_R), FILLET1_R, 180, 90)
            Line((0, FILLET1_R), (0, 0))
            Line((0, 0), (FILLET1_R, 0))
        make_face()
    extrude(amount=2.951794919, mode=Mode.SUBTRACT)
    with BuildSketch(Plane(origin=(0.22, 1.734294919, -0.44), x_dir=(-1, 0, 0), z_dir=(0, -1, 0)), Plane(origin=(-0.22, -1.2175, 0), x_dir=(0, 0, -1), z_dir=(0, 1, 0))) as fillet1_piece_10:
        with BuildLine():
            CenterArc((FILLET1_R, -FILLET1_R), FILLET1_R, 90, 90)
            Line((0, -FILLET1_R), (0, 0))
            Line((0, 0), (FILLET1_R, 0))
        make_face()
    extrude(amount=2.951794919, mode=Mode.SUBTRACT)
    with BuildSketch(Plane(origin=(-0.22, -1.2175, 0.2), x_dir=(0, 0, -1), z_dir=(0, 1, 0))) as fillet1_piece_11:
        with BuildLine():
            CenterArc((0.64 - FILLET1_R, -FILLET1_R), FILLET1_R, 360, 90)
            Line((0.64, -FILLET1_R), (0.64, 0))
            Line((0.64, 0), (0.64 - FILLET1_R, 0))
        make_face()
    revolve(axis=Axis((-0.22, -1.2175, 0.2), (-1, 0, 0)), revolution_arc=90, mode=Mode.SUBTRACT)
    with BuildSketch(Plane(origin=(0.22, -1.2175, 0.2), x_dir=(0, 0, -1), z_dir=(0, 1, 0))) as fillet1_piece_12:
        with BuildLine():
            CenterArc((0.64 - FILLET1_R, FILLET1_R), FILLET1_R, 270, 90)
            Line((0.64 - FILLET1_R, 0), (0.64, 0))
            Line((0.64, 0), (0.64, FILLET1_R))
        make_face()
    revolve(axis=Axis((0.22, -1.2175, 0.2), (-1, 0, 0)), revolution_arc=90, mode=Mode.SUBTRACT)
    with BuildSketch(Plane(origin=(-0.22, -1.2175, 0.2), x_dir=(0, -1, 0), z_dir=(0, 0, 1))) as fillet1_piece_13:
        with BuildLine():
            CenterArc((0.2 + FILLET1_R, FILLET1_R), FILLET1_R, 180, 90)
            Line((0.2, FILLET1_R), (0.2, 0))
            Line((0.2, 0), (0.2 + FILLET1_R, 0))
        make_face()
    revolve(axis=Axis((-0.22, -1.2175, 0.2), (1, 0, 0)), revolution_arc=90, mode=Mode.SUBTRACT)
    with BuildSketch(Plane(origin=(0.22, -1.2175, 0.2), x_dir=(0, -1, 0), z_dir=(0, 0, 1))) as fillet1_piece_14:
        with BuildLine():
            CenterArc((0.2 + FILLET1_R, -FILLET1_R), FILLET1_R, 90, 90)
            Line((0.2 + FILLET1_R, 0), (0.2, 0))
            Line((0.2, 0), (0.2, -FILLET1_R))
        make_face()
    revolve(axis=Axis((0.22, -1.2175, 0.2), (1, 0, 0)), revolution_arc=90, mode=Mode.SUBTRACT)
    with BuildSketch(Plane(origin=(0.22, -1.4175, 1.436794919), x_dir=(-1, 0, 0), z_dir=(0, 0, -1)), Plane(origin=(0.22, -1.8575, 0.2), x_dir=(-1, 0, 0), z_dir=(0, 0, 1)), Plane(origin=(-0.22, -1.8575, 0.2), x_dir=(0, 1, 0), z_dir=(0, 0, 1)), Plane(origin=(-0.22, -1.4175, 1.436794919), x_dir=(0, -1, 0), z_dir=(0, 0, -1))) as fillet1_piece_15:
        with BuildLine():
            CenterArc((FILLET1_R, -FILLET1_R), FILLET1_R, 90, 90)
            Line((0, -FILLET1_R), (0, 0))
            Line((0, 0), (FILLET1_R, 0))
        make_face()
    extrude(amount=1.236794919, mode=Mode.SUBTRACT)
    with BuildSketch(Plane(origin=(-0.108452995, 1.8575, -0.1), x_dir=(0, -0.8660254037844376, 0.500000000000002), z_dir=(1, 0, 0)), Plane(origin=(-0.108452995, 1.8575, -0.34), x_dir=(0, 0, 1), z_dir=(1, 0, 0)), Plane(origin=(-0.108452995, -1.7575, 1.56), x_dir=(0, -0.49999999999999795, -0.8660254037844398), z_dir=(1, 0, 0))) as fillet1_piece_16:
        with BuildLine():
            CenterArc((FILLET1_R * 0.57735026919, FILLET1_R), FILLET1_R, 210, 60)
            Line((-FILLET1_R * 0.288675134595, FILLET1_R * 0.5), (0, 0))
            Line((0, 0), (FILLET1_R * 0.57735026919, 0))
        make_face()
    extrude(amount=0.216905989, mode=Mode.SUBTRACT)
    with BuildSketch(Plane(origin=(0.12, 1.8575, -0.111547005), x_dir=(-1, 0, 0), z_dir=(0, 0, -1)), Plane(origin=(-0.12, 1.8575, -0.111547005), x_dir=(-0.5000000000000002, -0.8660254037844386, 0), z_dir=(0, 0, -1)), Plane(origin=(-0.108452995, -1.5175, 1.56), x_dir=(0, 0.49999999999998357, -0.8660254037844481), z_dir=(1, 0, 0)), Plane(origin=(-0.12, -1.745952995, 1.56), x_dir=(-0.5000000000000027, 3.023711536277452e-15, -0.8660254037844372), z_dir=(0, 1, 0)), Plane(origin=(0.12, -1.745952995, 1.56), x_dir=(-1, 0, 0), z_dir=(0, 1, 0))) as fillet1_piece_17:
        with BuildLine():
            CenterArc((FILLET1_R * 0.57735026919, -FILLET1_R), FILLET1_R, 90, 60)
            Line((-FILLET1_R * 0.288675134595, -FILLET1_R * 0.5), (0, 0))
            Line((0, 0), (FILLET1_R * 0.57735026919, 0))
        make_face()
    extrude(amount=0.216905989, mode=Mode.SUBTRACT)
    with BuildSketch(Plane(origin=(0.122309401, 1.8535, -0.342309401), x_dir=(-0.8944271909999167, -0.3872983346207399, -0.22360679774997883), z_dir=(0.4472135954999563, -0.7745966692414852, -0.4472135954999564)), Plane(origin=(-0.122309401, 1.8535, -0.342309401), x_dir=(-0.22360679774998504, -0.3872983346207364, 0.8944271909999166), z_dir=(-0.4472135954999562, -0.7745966692414853, -0.44721359549995643)), Plane(origin=(-0.122309401, -1.515190599, 1.556), x_dir=(-0.22360679774997835, -0.8944271909999151, -0.3872983346207441), z_dir=(-0.44721359549995615, 0.4472135954999597, -0.7745966692414834)), Plane(origin=(0.122309401, -1.515190599, 1.556), x_dir=(-0.8944271909999167, 0.2236067977499787, -0.3872983346207397), z_dir=(0.4472135954999561, 0.44721359549995976, -0.7745966692414834))) as fillet1_piece_18:
        with BuildLine():
            CenterArc((FILLET1_R * 0.774596669241, -FILLET1_R), FILLET1_R, 90, 75.522487814)
            Line((-FILLET1_R * 0.19364916731, -FILLET1_R * 0.75), (0, 0))
            Line((0, 0), (FILLET1_R * 0.774596669241, 0))
        make_face()
    extrude(amount=0.257172653, mode=Mode.SUBTRACT)
    with BuildSketch(Plane(origin=(0.122309401, 1.8535, -0.097690599), x_dir=(-0.8944271909999166, -0.3872983346207399, 0.22360679774997883), z_dir=(0.4472135954999564, -0.7745966692414853, 0.4472135954999563)), Plane(origin=(-0.122309401, 1.8535, -0.097690599), x_dir=(-0.22360679774998238, -0.3872983346207379, -0.8944271909999167), z_dir=(-0.44721359549995626, -0.7745966692414854, 0.4472135954999564)), Plane(origin=(-0.122309401, -1.759809401, 1.556), x_dir=(-0.22360679774997672, 0.8944271909999183, -0.38729833462073776), z_dir=(-0.44721359549995626, -0.44721359549995343, -0.774596669241487)), Plane(origin=(0.122309401, -1.759809401, 1.556), x_dir=(-0.8944271909999166, -0.22360679774999576, -0.3872983346207301), z_dir=(0.4472135954999564, -0.4472135954999535, -0.774596669241487))) as fillet1_piece_19:
        with BuildLine():
            CenterArc((FILLET1_R * 0.774596669241, FILLET1_R), FILLET1_R, 194.477512186, 75.522487814)
            Line((-FILLET1_R * 0.19364916731, FILLET1_R * 0.75), (0, 0))
            Line((0, 0), (FILLET1_R * 0.774596669241, 0))
        make_face()
    extrude(amount=0.257172653, mode=Mode.SUBTRACT)


solid = part.part
